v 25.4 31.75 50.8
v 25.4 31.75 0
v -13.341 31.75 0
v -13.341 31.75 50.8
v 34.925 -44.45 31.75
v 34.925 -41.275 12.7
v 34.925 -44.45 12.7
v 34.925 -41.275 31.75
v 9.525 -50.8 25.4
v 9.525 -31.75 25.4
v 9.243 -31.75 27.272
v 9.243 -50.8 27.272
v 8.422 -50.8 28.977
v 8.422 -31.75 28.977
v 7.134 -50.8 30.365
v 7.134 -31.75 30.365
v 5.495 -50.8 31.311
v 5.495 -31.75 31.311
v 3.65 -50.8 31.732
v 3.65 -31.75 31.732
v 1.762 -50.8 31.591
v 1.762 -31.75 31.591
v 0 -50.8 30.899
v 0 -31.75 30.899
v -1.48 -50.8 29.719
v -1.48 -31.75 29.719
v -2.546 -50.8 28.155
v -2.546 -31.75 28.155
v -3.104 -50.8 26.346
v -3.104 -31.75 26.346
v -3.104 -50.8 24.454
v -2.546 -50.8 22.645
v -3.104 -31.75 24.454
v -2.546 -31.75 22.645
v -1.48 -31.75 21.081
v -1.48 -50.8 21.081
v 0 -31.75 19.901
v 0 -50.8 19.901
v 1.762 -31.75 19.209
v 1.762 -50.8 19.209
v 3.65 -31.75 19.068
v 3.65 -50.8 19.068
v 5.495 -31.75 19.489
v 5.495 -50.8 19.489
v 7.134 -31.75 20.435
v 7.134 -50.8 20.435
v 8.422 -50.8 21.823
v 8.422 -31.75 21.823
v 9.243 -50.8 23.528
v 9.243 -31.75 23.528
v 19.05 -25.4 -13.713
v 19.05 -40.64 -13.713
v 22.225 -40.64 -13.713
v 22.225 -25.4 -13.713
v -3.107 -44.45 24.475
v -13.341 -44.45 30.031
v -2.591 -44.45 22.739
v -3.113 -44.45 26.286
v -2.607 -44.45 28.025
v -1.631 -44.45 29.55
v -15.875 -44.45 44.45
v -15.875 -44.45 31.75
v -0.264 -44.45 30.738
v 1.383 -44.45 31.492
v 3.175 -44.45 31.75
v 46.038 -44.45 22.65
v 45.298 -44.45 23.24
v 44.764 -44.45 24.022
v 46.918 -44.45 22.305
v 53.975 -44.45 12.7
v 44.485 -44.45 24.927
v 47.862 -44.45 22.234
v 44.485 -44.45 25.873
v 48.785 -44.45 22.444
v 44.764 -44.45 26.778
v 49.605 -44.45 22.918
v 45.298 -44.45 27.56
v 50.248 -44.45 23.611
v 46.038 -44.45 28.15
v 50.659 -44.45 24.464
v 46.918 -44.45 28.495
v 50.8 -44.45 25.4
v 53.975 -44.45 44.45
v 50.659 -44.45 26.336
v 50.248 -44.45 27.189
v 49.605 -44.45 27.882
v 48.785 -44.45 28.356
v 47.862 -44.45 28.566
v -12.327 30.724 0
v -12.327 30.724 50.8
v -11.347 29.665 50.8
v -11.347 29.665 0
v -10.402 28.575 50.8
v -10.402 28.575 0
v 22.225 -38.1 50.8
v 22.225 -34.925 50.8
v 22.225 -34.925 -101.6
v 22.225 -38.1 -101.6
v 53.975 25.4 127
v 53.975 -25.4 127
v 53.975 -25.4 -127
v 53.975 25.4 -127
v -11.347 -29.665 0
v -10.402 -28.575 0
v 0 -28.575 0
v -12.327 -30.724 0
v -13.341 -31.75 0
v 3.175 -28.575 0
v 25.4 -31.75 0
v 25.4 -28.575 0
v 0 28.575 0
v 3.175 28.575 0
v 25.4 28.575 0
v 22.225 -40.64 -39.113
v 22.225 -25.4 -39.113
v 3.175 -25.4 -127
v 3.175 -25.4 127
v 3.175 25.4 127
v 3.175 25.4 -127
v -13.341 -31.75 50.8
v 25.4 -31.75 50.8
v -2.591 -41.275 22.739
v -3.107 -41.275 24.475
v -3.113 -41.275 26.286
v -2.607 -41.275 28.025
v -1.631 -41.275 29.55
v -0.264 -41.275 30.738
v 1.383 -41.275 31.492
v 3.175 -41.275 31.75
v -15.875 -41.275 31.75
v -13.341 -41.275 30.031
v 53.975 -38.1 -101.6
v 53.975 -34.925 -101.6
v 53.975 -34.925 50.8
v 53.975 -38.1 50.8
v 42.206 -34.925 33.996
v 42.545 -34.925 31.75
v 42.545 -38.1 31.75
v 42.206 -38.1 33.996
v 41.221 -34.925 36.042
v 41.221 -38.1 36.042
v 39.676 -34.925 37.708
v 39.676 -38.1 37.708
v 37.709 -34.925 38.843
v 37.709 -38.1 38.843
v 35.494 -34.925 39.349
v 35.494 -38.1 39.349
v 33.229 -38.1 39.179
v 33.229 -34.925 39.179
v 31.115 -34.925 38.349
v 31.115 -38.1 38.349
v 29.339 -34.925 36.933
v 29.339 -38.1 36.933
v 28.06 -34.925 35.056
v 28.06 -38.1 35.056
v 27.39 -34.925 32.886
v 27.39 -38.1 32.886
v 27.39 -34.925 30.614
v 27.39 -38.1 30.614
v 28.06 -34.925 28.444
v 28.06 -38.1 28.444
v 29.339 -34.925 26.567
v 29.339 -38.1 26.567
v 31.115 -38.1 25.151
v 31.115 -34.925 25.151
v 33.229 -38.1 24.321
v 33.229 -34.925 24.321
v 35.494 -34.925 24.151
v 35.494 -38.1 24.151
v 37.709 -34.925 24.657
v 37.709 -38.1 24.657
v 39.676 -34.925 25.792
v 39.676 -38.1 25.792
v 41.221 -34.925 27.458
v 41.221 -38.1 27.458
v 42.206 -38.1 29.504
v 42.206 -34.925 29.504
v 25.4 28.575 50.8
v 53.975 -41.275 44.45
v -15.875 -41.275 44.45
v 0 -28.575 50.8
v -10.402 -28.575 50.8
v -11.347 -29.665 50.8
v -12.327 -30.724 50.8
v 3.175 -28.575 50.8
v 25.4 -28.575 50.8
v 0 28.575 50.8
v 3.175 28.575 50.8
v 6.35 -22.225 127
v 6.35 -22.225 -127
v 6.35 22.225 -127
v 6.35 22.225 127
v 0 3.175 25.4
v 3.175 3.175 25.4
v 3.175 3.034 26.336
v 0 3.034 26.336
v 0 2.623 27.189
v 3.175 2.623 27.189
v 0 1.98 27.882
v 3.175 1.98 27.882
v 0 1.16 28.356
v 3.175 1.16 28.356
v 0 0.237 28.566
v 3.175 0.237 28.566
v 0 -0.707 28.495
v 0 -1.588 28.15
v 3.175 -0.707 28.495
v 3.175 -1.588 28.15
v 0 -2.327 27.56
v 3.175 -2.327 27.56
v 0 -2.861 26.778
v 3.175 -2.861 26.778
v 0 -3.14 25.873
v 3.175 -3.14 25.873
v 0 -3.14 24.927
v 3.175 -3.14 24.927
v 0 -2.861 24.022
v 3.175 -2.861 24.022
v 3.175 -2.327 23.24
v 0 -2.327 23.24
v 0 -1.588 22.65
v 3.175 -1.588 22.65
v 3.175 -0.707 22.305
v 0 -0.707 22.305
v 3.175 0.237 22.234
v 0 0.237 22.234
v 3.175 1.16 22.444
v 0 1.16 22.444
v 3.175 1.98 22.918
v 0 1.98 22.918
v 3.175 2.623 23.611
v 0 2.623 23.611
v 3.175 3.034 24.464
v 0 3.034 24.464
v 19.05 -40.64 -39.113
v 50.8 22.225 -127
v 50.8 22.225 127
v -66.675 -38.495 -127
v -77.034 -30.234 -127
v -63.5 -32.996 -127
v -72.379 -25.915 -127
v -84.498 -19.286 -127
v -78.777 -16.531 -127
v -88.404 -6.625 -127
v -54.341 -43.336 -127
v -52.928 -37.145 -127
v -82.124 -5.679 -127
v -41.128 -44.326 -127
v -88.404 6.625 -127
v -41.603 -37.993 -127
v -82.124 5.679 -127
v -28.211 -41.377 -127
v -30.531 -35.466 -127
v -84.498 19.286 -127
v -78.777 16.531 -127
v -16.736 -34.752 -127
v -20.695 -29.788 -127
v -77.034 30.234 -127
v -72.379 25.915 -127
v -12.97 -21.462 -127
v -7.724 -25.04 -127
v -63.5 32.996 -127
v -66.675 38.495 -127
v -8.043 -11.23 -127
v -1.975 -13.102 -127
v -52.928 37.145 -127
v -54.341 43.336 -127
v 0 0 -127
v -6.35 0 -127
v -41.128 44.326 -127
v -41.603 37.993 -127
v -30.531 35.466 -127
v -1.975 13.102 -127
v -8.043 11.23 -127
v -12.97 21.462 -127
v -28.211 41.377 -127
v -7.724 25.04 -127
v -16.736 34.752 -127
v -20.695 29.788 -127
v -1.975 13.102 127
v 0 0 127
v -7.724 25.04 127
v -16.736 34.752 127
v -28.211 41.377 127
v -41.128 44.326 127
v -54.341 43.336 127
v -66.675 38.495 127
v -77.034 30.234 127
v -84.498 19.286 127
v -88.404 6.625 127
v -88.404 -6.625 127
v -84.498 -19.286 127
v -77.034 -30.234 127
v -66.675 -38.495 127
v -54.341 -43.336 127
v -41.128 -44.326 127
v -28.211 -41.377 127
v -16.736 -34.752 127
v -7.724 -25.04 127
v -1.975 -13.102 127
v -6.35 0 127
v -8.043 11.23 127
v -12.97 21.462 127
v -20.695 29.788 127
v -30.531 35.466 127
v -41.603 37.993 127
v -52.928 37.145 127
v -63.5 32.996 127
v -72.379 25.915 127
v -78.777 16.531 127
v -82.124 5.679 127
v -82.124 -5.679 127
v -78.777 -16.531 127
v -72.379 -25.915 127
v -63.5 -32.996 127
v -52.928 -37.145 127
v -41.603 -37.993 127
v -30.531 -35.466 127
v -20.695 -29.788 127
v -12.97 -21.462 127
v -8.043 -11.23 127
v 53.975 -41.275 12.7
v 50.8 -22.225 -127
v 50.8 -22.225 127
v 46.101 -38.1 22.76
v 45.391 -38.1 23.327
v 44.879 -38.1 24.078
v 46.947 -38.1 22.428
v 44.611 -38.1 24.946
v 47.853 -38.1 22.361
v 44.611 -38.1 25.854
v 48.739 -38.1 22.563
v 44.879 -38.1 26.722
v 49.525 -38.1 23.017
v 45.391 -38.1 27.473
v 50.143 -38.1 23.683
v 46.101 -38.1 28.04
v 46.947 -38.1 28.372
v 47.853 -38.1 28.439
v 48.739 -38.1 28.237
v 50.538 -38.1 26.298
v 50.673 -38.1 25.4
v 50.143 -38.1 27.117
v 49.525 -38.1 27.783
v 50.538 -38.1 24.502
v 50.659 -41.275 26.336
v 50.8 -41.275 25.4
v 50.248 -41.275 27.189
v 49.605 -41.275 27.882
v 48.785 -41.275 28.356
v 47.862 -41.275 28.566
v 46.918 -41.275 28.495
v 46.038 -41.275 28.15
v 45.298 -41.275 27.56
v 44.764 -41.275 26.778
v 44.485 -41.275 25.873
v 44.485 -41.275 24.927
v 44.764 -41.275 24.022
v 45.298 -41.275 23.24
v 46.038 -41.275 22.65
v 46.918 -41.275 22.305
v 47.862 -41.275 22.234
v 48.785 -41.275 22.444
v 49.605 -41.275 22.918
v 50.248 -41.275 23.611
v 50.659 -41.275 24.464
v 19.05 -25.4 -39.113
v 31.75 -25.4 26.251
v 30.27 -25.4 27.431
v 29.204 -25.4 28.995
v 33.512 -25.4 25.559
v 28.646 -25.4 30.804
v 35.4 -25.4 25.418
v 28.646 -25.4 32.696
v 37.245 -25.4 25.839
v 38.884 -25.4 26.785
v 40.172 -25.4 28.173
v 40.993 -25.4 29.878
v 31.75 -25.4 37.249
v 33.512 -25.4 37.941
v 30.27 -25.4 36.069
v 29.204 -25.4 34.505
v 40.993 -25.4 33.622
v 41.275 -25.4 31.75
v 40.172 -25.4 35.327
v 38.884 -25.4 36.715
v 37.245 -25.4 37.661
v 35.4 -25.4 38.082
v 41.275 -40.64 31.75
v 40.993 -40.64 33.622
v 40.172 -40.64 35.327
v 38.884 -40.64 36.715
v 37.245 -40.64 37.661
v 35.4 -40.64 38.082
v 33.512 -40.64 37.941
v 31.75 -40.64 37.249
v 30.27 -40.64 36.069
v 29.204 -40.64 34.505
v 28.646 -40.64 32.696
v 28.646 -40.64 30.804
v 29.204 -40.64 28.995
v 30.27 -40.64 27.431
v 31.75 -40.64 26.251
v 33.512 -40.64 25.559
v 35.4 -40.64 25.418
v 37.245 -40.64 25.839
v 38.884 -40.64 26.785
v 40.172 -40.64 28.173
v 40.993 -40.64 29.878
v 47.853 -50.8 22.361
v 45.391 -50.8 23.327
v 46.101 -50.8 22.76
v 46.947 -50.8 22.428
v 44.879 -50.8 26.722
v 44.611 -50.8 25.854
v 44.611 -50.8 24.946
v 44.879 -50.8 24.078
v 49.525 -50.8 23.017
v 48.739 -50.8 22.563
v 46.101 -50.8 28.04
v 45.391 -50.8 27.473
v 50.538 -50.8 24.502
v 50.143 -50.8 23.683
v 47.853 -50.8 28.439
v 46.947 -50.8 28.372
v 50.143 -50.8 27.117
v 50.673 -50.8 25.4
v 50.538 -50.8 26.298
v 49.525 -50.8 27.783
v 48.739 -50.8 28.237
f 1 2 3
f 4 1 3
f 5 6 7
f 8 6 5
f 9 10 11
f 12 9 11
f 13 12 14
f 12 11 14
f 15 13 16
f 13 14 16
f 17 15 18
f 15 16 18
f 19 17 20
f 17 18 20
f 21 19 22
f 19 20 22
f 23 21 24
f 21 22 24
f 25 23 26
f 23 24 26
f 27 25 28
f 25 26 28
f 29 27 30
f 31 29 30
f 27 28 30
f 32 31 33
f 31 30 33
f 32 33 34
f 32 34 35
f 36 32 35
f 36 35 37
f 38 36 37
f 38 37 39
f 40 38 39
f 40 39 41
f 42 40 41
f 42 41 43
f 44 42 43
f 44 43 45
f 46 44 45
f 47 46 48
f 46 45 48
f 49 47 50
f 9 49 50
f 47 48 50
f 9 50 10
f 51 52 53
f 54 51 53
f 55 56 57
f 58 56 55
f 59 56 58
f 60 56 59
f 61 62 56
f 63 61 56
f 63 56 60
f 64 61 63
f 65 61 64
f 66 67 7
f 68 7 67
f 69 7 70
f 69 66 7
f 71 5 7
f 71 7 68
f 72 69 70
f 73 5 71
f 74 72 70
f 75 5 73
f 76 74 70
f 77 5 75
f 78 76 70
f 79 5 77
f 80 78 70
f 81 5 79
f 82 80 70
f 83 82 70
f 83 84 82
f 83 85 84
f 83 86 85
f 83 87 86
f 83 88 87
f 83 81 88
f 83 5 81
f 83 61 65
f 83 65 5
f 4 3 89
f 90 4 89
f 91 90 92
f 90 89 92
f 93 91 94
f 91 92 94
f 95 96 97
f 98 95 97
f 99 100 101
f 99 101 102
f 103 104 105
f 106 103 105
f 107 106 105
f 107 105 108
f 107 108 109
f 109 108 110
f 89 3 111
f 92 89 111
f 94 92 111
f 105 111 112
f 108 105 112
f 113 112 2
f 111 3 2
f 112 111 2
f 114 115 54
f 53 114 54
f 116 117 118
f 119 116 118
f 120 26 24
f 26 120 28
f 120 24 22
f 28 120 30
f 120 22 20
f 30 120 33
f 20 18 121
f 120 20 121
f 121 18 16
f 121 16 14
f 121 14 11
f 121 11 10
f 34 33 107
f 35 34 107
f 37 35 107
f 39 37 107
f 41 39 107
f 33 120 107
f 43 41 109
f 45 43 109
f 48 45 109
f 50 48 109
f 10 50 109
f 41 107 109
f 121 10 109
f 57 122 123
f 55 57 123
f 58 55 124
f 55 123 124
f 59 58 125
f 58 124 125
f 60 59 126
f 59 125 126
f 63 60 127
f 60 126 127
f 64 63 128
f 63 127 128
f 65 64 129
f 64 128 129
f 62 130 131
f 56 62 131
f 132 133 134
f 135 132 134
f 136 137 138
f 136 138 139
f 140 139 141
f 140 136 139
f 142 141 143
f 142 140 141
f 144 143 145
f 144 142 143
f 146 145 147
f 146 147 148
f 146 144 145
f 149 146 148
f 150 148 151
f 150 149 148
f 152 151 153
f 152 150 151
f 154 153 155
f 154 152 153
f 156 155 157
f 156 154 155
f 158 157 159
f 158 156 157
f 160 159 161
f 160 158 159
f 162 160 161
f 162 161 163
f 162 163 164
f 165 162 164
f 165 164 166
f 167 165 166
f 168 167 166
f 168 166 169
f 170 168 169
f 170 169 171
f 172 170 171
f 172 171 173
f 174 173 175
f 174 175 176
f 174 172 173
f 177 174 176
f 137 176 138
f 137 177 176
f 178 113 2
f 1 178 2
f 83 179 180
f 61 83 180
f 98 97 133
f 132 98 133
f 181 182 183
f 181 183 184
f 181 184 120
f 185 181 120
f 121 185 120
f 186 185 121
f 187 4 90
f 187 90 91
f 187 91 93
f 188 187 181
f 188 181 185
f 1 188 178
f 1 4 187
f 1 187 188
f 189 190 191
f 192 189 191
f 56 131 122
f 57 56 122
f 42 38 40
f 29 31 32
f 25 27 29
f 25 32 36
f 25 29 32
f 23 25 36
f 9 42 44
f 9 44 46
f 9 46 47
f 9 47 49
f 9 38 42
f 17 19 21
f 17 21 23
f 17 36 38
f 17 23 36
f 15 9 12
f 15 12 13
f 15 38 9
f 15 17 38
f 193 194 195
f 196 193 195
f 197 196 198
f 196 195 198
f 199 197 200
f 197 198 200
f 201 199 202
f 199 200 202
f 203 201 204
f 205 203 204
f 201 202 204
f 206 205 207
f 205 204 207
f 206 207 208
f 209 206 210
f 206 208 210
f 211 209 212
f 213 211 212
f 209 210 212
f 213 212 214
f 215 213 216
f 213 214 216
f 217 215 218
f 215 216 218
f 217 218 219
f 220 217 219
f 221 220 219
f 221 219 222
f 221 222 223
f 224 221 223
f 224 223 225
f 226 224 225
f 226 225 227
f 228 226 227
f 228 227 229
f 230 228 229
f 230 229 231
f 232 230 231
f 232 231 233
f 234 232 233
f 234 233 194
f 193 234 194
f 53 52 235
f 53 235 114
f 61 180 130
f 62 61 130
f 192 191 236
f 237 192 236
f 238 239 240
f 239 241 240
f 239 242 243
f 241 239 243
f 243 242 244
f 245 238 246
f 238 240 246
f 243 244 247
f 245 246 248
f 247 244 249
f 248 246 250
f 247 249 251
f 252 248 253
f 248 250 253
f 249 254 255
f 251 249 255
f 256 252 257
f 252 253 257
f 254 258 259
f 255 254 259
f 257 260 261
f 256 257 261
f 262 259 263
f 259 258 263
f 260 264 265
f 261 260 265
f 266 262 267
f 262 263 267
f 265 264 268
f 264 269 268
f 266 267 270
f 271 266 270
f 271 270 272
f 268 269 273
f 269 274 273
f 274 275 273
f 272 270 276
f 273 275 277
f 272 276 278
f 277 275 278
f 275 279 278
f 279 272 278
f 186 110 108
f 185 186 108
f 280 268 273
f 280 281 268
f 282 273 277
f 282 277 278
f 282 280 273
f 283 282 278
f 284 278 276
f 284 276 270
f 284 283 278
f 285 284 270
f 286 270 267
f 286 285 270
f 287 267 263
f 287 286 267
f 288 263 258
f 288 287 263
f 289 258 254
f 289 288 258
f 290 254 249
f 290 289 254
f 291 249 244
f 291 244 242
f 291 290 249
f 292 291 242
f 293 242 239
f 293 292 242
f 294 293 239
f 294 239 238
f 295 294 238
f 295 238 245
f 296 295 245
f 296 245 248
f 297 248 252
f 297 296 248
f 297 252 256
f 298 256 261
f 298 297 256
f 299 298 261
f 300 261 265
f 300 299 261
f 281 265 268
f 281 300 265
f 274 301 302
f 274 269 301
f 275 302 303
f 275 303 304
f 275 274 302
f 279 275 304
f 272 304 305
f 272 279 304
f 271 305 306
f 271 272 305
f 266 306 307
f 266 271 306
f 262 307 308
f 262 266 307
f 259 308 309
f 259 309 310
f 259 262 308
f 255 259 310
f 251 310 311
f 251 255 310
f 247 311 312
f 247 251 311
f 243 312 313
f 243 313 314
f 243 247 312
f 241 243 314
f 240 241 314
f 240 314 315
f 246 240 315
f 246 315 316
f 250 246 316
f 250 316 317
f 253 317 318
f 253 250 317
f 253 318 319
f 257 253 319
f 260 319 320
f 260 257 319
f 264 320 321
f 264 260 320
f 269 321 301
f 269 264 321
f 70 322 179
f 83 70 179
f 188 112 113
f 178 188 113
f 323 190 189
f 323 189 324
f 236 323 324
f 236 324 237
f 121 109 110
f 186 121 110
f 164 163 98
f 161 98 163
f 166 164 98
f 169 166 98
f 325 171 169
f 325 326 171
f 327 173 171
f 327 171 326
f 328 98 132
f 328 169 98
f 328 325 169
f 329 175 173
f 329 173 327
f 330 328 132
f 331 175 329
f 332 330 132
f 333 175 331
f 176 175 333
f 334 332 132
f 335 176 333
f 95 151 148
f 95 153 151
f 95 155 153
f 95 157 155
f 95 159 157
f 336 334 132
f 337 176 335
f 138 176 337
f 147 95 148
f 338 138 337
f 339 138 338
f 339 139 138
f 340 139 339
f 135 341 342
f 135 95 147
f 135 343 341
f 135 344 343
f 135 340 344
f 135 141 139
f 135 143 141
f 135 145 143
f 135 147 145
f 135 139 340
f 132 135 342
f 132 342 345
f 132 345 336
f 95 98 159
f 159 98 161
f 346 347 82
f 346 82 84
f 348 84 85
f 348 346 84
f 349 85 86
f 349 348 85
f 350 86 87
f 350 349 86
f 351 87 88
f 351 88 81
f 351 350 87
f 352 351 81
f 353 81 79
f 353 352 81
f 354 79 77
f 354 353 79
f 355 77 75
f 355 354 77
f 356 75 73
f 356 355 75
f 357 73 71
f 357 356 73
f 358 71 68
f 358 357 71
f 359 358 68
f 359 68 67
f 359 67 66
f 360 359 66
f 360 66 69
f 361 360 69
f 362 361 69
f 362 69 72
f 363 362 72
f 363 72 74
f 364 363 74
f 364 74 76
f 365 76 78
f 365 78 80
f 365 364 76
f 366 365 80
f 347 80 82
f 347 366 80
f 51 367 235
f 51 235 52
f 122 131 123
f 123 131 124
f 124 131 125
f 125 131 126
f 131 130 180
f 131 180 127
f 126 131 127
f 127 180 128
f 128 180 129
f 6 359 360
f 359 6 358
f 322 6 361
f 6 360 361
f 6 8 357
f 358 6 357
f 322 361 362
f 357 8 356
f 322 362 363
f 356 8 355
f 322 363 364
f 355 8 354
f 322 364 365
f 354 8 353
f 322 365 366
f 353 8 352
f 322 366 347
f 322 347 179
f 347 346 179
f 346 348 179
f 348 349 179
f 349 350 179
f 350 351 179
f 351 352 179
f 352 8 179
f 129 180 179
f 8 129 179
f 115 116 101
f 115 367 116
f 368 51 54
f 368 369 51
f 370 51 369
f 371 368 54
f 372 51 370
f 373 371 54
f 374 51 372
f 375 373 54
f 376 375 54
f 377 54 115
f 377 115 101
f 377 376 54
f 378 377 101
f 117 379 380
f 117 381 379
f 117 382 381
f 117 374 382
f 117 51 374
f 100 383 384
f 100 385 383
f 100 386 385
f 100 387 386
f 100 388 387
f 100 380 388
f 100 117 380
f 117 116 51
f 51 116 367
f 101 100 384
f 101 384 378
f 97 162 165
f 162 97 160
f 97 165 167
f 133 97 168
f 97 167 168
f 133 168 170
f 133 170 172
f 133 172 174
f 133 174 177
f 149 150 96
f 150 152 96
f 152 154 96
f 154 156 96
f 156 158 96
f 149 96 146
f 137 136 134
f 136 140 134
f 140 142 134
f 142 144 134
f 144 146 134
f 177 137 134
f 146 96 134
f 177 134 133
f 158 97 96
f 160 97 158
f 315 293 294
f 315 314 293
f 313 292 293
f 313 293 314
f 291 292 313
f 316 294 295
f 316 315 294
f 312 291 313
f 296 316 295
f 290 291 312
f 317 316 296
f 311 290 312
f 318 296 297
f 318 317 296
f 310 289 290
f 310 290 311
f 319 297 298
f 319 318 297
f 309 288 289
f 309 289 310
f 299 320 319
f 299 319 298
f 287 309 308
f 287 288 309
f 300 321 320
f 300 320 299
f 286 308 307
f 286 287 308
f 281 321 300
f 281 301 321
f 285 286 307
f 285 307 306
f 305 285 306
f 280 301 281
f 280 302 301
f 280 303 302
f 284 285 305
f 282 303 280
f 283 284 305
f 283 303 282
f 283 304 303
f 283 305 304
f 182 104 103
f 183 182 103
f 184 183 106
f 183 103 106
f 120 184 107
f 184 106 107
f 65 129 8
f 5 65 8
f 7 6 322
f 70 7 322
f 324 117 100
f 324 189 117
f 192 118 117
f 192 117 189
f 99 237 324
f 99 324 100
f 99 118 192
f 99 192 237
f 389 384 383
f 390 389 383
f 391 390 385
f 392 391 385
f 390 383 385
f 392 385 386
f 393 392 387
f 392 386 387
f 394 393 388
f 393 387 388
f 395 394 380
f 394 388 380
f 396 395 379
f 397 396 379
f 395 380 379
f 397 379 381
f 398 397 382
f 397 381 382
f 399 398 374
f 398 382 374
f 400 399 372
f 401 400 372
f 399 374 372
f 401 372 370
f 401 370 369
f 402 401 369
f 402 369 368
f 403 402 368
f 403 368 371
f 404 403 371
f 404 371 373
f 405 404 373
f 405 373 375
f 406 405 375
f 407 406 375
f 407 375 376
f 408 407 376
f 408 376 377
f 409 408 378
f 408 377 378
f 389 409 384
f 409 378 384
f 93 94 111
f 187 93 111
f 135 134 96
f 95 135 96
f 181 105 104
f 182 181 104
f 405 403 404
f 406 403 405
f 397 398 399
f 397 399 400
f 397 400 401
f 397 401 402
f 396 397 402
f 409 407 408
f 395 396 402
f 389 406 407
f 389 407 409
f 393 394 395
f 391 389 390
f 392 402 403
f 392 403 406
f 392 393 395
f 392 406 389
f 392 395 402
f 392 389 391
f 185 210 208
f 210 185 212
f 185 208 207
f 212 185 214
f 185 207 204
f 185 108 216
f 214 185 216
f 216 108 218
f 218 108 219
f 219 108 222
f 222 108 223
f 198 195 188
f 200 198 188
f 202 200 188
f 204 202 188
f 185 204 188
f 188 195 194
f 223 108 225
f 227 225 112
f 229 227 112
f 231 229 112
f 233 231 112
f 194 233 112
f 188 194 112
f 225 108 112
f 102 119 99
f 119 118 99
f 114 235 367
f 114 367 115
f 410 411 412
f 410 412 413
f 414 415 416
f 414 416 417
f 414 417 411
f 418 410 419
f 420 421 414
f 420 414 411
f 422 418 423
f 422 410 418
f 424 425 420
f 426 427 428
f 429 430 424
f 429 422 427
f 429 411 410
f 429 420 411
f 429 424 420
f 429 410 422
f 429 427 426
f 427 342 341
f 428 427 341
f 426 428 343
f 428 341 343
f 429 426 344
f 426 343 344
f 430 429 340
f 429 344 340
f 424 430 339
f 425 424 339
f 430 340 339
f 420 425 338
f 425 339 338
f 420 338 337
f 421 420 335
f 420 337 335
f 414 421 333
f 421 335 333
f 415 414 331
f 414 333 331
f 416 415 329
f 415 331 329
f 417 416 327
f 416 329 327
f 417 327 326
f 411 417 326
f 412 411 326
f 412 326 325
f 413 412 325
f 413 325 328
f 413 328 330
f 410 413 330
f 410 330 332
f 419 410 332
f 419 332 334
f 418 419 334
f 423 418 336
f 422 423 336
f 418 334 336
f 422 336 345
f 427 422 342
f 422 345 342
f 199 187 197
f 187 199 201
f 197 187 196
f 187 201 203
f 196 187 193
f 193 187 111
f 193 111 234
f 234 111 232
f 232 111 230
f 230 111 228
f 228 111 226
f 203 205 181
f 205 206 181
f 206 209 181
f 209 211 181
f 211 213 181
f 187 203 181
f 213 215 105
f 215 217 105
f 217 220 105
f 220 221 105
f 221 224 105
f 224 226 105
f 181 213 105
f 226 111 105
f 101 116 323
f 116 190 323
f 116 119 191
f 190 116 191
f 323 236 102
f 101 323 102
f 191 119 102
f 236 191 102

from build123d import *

# Parameters (mm, degrees)
F1_DEPTH  = 50.8
F2_R      = 3.175
F3_DEPTH  = 16.5174802667
F4_R      = 44.45
F4_R_2    = 38.1
F5_DEPTH  = 127
F4_W      = 50.8
F4_H      = 50.8
F4_W_2    = 44.45
F4_H_2    = 44.45
F6_R      = 6.35
F7_DEPTH  = 19.05
F8_R      = 6.35
F8_W      = 3.175
F8_H      = 25.4
F9_DEPTH  = 15.24
F11_START = 9.525
F10_W     = 19.05
F10_H     = 19.05
F10_R     = 3.175
F11_DEPTH = 3.175
F12_START = 9.525
F8_R_2    = 7.62
F12_DEPTH = 3.175
F13_R     = 3.048
F14_DEPTH = 12.7


with BuildPart() as f1:
    # F0 (on Top) → F1 (new body)
    with BuildSketch(Plane.XY):
        with BuildLine():
            Line((0, 28.575), (0, 31.75))
            Line((0, 31.75), (-13.3414802667, 31.75))
            ThreePointArc((-13.3414802667, 31.75), (-11.8330437127, 30.1982890666), (-10.4019181891, 28.575))
            Line((-10.4019181891, 28.575), (0, 28.575))
        make_face()
        Polygon((25.4, 28.575), (25.4, 31.75), (0, 31.75), (0, 28.575), (0, -28.575), (0, -31.75), (25.4, -31.75), (25.4, -28.575), (3.175, -28.575), (3.175, 28.575), align=None)
        with BuildLine():
            Line((0, -31.75), (0, -28.575))
            Line((0, -28.575), (-10.4019181891, -28.575))
            ThreePointArc((-10.4019181891, -28.575), (-11.8330437127, -30.1982890666), (-13.3414802667, -31.75))
            Line((-13.3414802667, -31.75), (0, -31.75))
        make_face()
    extrude(amount=F1_DEPTH)

    # F2 (on face) → F3 (cut, through all)
    with BuildSketch(Plane.YZ.offset(3.175)):
        with Locations((0, 25.4)):
            Circle(F2_R)
    extrude(amount=-F3_DEPTH, mode=Mode.SUBTRACT)

    # F6 (on face) → F7 (join)
    with BuildSketch(Plane.XZ.offset(31.75)):
        with Locations((3.175, 25.4)):
            Circle(F6_R)
    extrude(amount=F7_DEPTH)


with BuildPart() as f5:
    # F4 (on Top) → F5 (new body, symmetric)
    with BuildSketch(Plane.XY):
        with Locations((-44.45, 0)):
            Circle(F4_R)
        with Locations((-44.45, 0)):
            Circle(F4_R_2, mode=Mode.SUBTRACT)
    extrude(amount=F5_DEPTH, both=True)


with BuildPart() as f5b:
    # F4 (on Top) → F5, piece 2 (new body, symmetric)
    with BuildSketch(Plane.XY):
        with Locations((28.575, 0)):
            Rectangle(F4_W, F4_H)
        with Locations((28.575, 0)):
            Rectangle(F4_W_2, F4_H_2, mode=Mode.SUBTRACT)
    extrude(amount=F5_DEPTH, both=True)

    # F8 (on face) → F9 (join)
    with BuildSketch(Plane.XZ.offset(25.4)):
        with Locations((34.925, 31.75)):
            Circle(F8_R)
        with Locations((20.6375, -26.4134507954)):
            Rectangle(F8_W, F8_H)
    extrude(amount=F9_DEPTH)


with BuildPart() as f11:
    # F10 (on face) → F11 (new body)
    with BuildSketch(Plane.XZ.offset(31.75).offset(F11_START)):
        Polygon((-13.3414802667, 30.0314808332), (-13.3414802667, 44.45), (-15.875, 44.45), (-15.875, 31.75), align=None)
        Polygon((25.4, 31.75), (34.925, 31.75), (53.975, 31.75), (53.975, 44.45), (25.4, 44.45), align=None)
        with BuildLine():
            Line((3.175, 31.75), (25.4, 31.75))
            Line((25.4, 31.75), (25.4, 44.45))
            Line((25.4, 44.45), (-13.3414802667, 44.45))
            Line((-13.3414802667, 44.45), (-13.3414802667, 30.0314808332))
            Line((-13.3414802667, 30.0314808332), (-2.5905420916, 22.7389805731))
            ThreePointArc((-2.5905420916, 22.7389805731), (-2.173830403, 28.8223549377), (3.175, 31.75))
        make_face()
        with Locations((44.45, 22.225)):
            Rectangle(F10_W, F10_H)
        with Locations((47.625, 25.4)):
            Circle(F10_R, mode=Mode.SUBTRACT)
    extrude(amount=F11_DEPTH)


with BuildPart() as f12:
    # F8 (on face) → F12 (new body)
    with BuildSketch(Plane.XZ.offset(25.4).offset(F12_START)):
        Polygon((53.975, -101.6), (53.975, 50.8), (22.225, 50.8), (22.225, -13.7134507954), (22.225, -39.1134507954), (22.225, -101.6), align=None)
        with Locations((34.925, 31.75)):
            Circle(F8_R_2, mode=Mode.SUBTRACT)
    extrude(amount=F12_DEPTH)

    # F13 (on face) → F14 (join)
    with BuildSketch(Plane.XZ.offset(38.1)):
        with Locations((47.625, 25.4)):
            Circle(F13_R)
    extrude(amount=F14_DEPTH)


solid = Compound([f1.part, f5.part, f5b.part, f11.part, f12.part])
